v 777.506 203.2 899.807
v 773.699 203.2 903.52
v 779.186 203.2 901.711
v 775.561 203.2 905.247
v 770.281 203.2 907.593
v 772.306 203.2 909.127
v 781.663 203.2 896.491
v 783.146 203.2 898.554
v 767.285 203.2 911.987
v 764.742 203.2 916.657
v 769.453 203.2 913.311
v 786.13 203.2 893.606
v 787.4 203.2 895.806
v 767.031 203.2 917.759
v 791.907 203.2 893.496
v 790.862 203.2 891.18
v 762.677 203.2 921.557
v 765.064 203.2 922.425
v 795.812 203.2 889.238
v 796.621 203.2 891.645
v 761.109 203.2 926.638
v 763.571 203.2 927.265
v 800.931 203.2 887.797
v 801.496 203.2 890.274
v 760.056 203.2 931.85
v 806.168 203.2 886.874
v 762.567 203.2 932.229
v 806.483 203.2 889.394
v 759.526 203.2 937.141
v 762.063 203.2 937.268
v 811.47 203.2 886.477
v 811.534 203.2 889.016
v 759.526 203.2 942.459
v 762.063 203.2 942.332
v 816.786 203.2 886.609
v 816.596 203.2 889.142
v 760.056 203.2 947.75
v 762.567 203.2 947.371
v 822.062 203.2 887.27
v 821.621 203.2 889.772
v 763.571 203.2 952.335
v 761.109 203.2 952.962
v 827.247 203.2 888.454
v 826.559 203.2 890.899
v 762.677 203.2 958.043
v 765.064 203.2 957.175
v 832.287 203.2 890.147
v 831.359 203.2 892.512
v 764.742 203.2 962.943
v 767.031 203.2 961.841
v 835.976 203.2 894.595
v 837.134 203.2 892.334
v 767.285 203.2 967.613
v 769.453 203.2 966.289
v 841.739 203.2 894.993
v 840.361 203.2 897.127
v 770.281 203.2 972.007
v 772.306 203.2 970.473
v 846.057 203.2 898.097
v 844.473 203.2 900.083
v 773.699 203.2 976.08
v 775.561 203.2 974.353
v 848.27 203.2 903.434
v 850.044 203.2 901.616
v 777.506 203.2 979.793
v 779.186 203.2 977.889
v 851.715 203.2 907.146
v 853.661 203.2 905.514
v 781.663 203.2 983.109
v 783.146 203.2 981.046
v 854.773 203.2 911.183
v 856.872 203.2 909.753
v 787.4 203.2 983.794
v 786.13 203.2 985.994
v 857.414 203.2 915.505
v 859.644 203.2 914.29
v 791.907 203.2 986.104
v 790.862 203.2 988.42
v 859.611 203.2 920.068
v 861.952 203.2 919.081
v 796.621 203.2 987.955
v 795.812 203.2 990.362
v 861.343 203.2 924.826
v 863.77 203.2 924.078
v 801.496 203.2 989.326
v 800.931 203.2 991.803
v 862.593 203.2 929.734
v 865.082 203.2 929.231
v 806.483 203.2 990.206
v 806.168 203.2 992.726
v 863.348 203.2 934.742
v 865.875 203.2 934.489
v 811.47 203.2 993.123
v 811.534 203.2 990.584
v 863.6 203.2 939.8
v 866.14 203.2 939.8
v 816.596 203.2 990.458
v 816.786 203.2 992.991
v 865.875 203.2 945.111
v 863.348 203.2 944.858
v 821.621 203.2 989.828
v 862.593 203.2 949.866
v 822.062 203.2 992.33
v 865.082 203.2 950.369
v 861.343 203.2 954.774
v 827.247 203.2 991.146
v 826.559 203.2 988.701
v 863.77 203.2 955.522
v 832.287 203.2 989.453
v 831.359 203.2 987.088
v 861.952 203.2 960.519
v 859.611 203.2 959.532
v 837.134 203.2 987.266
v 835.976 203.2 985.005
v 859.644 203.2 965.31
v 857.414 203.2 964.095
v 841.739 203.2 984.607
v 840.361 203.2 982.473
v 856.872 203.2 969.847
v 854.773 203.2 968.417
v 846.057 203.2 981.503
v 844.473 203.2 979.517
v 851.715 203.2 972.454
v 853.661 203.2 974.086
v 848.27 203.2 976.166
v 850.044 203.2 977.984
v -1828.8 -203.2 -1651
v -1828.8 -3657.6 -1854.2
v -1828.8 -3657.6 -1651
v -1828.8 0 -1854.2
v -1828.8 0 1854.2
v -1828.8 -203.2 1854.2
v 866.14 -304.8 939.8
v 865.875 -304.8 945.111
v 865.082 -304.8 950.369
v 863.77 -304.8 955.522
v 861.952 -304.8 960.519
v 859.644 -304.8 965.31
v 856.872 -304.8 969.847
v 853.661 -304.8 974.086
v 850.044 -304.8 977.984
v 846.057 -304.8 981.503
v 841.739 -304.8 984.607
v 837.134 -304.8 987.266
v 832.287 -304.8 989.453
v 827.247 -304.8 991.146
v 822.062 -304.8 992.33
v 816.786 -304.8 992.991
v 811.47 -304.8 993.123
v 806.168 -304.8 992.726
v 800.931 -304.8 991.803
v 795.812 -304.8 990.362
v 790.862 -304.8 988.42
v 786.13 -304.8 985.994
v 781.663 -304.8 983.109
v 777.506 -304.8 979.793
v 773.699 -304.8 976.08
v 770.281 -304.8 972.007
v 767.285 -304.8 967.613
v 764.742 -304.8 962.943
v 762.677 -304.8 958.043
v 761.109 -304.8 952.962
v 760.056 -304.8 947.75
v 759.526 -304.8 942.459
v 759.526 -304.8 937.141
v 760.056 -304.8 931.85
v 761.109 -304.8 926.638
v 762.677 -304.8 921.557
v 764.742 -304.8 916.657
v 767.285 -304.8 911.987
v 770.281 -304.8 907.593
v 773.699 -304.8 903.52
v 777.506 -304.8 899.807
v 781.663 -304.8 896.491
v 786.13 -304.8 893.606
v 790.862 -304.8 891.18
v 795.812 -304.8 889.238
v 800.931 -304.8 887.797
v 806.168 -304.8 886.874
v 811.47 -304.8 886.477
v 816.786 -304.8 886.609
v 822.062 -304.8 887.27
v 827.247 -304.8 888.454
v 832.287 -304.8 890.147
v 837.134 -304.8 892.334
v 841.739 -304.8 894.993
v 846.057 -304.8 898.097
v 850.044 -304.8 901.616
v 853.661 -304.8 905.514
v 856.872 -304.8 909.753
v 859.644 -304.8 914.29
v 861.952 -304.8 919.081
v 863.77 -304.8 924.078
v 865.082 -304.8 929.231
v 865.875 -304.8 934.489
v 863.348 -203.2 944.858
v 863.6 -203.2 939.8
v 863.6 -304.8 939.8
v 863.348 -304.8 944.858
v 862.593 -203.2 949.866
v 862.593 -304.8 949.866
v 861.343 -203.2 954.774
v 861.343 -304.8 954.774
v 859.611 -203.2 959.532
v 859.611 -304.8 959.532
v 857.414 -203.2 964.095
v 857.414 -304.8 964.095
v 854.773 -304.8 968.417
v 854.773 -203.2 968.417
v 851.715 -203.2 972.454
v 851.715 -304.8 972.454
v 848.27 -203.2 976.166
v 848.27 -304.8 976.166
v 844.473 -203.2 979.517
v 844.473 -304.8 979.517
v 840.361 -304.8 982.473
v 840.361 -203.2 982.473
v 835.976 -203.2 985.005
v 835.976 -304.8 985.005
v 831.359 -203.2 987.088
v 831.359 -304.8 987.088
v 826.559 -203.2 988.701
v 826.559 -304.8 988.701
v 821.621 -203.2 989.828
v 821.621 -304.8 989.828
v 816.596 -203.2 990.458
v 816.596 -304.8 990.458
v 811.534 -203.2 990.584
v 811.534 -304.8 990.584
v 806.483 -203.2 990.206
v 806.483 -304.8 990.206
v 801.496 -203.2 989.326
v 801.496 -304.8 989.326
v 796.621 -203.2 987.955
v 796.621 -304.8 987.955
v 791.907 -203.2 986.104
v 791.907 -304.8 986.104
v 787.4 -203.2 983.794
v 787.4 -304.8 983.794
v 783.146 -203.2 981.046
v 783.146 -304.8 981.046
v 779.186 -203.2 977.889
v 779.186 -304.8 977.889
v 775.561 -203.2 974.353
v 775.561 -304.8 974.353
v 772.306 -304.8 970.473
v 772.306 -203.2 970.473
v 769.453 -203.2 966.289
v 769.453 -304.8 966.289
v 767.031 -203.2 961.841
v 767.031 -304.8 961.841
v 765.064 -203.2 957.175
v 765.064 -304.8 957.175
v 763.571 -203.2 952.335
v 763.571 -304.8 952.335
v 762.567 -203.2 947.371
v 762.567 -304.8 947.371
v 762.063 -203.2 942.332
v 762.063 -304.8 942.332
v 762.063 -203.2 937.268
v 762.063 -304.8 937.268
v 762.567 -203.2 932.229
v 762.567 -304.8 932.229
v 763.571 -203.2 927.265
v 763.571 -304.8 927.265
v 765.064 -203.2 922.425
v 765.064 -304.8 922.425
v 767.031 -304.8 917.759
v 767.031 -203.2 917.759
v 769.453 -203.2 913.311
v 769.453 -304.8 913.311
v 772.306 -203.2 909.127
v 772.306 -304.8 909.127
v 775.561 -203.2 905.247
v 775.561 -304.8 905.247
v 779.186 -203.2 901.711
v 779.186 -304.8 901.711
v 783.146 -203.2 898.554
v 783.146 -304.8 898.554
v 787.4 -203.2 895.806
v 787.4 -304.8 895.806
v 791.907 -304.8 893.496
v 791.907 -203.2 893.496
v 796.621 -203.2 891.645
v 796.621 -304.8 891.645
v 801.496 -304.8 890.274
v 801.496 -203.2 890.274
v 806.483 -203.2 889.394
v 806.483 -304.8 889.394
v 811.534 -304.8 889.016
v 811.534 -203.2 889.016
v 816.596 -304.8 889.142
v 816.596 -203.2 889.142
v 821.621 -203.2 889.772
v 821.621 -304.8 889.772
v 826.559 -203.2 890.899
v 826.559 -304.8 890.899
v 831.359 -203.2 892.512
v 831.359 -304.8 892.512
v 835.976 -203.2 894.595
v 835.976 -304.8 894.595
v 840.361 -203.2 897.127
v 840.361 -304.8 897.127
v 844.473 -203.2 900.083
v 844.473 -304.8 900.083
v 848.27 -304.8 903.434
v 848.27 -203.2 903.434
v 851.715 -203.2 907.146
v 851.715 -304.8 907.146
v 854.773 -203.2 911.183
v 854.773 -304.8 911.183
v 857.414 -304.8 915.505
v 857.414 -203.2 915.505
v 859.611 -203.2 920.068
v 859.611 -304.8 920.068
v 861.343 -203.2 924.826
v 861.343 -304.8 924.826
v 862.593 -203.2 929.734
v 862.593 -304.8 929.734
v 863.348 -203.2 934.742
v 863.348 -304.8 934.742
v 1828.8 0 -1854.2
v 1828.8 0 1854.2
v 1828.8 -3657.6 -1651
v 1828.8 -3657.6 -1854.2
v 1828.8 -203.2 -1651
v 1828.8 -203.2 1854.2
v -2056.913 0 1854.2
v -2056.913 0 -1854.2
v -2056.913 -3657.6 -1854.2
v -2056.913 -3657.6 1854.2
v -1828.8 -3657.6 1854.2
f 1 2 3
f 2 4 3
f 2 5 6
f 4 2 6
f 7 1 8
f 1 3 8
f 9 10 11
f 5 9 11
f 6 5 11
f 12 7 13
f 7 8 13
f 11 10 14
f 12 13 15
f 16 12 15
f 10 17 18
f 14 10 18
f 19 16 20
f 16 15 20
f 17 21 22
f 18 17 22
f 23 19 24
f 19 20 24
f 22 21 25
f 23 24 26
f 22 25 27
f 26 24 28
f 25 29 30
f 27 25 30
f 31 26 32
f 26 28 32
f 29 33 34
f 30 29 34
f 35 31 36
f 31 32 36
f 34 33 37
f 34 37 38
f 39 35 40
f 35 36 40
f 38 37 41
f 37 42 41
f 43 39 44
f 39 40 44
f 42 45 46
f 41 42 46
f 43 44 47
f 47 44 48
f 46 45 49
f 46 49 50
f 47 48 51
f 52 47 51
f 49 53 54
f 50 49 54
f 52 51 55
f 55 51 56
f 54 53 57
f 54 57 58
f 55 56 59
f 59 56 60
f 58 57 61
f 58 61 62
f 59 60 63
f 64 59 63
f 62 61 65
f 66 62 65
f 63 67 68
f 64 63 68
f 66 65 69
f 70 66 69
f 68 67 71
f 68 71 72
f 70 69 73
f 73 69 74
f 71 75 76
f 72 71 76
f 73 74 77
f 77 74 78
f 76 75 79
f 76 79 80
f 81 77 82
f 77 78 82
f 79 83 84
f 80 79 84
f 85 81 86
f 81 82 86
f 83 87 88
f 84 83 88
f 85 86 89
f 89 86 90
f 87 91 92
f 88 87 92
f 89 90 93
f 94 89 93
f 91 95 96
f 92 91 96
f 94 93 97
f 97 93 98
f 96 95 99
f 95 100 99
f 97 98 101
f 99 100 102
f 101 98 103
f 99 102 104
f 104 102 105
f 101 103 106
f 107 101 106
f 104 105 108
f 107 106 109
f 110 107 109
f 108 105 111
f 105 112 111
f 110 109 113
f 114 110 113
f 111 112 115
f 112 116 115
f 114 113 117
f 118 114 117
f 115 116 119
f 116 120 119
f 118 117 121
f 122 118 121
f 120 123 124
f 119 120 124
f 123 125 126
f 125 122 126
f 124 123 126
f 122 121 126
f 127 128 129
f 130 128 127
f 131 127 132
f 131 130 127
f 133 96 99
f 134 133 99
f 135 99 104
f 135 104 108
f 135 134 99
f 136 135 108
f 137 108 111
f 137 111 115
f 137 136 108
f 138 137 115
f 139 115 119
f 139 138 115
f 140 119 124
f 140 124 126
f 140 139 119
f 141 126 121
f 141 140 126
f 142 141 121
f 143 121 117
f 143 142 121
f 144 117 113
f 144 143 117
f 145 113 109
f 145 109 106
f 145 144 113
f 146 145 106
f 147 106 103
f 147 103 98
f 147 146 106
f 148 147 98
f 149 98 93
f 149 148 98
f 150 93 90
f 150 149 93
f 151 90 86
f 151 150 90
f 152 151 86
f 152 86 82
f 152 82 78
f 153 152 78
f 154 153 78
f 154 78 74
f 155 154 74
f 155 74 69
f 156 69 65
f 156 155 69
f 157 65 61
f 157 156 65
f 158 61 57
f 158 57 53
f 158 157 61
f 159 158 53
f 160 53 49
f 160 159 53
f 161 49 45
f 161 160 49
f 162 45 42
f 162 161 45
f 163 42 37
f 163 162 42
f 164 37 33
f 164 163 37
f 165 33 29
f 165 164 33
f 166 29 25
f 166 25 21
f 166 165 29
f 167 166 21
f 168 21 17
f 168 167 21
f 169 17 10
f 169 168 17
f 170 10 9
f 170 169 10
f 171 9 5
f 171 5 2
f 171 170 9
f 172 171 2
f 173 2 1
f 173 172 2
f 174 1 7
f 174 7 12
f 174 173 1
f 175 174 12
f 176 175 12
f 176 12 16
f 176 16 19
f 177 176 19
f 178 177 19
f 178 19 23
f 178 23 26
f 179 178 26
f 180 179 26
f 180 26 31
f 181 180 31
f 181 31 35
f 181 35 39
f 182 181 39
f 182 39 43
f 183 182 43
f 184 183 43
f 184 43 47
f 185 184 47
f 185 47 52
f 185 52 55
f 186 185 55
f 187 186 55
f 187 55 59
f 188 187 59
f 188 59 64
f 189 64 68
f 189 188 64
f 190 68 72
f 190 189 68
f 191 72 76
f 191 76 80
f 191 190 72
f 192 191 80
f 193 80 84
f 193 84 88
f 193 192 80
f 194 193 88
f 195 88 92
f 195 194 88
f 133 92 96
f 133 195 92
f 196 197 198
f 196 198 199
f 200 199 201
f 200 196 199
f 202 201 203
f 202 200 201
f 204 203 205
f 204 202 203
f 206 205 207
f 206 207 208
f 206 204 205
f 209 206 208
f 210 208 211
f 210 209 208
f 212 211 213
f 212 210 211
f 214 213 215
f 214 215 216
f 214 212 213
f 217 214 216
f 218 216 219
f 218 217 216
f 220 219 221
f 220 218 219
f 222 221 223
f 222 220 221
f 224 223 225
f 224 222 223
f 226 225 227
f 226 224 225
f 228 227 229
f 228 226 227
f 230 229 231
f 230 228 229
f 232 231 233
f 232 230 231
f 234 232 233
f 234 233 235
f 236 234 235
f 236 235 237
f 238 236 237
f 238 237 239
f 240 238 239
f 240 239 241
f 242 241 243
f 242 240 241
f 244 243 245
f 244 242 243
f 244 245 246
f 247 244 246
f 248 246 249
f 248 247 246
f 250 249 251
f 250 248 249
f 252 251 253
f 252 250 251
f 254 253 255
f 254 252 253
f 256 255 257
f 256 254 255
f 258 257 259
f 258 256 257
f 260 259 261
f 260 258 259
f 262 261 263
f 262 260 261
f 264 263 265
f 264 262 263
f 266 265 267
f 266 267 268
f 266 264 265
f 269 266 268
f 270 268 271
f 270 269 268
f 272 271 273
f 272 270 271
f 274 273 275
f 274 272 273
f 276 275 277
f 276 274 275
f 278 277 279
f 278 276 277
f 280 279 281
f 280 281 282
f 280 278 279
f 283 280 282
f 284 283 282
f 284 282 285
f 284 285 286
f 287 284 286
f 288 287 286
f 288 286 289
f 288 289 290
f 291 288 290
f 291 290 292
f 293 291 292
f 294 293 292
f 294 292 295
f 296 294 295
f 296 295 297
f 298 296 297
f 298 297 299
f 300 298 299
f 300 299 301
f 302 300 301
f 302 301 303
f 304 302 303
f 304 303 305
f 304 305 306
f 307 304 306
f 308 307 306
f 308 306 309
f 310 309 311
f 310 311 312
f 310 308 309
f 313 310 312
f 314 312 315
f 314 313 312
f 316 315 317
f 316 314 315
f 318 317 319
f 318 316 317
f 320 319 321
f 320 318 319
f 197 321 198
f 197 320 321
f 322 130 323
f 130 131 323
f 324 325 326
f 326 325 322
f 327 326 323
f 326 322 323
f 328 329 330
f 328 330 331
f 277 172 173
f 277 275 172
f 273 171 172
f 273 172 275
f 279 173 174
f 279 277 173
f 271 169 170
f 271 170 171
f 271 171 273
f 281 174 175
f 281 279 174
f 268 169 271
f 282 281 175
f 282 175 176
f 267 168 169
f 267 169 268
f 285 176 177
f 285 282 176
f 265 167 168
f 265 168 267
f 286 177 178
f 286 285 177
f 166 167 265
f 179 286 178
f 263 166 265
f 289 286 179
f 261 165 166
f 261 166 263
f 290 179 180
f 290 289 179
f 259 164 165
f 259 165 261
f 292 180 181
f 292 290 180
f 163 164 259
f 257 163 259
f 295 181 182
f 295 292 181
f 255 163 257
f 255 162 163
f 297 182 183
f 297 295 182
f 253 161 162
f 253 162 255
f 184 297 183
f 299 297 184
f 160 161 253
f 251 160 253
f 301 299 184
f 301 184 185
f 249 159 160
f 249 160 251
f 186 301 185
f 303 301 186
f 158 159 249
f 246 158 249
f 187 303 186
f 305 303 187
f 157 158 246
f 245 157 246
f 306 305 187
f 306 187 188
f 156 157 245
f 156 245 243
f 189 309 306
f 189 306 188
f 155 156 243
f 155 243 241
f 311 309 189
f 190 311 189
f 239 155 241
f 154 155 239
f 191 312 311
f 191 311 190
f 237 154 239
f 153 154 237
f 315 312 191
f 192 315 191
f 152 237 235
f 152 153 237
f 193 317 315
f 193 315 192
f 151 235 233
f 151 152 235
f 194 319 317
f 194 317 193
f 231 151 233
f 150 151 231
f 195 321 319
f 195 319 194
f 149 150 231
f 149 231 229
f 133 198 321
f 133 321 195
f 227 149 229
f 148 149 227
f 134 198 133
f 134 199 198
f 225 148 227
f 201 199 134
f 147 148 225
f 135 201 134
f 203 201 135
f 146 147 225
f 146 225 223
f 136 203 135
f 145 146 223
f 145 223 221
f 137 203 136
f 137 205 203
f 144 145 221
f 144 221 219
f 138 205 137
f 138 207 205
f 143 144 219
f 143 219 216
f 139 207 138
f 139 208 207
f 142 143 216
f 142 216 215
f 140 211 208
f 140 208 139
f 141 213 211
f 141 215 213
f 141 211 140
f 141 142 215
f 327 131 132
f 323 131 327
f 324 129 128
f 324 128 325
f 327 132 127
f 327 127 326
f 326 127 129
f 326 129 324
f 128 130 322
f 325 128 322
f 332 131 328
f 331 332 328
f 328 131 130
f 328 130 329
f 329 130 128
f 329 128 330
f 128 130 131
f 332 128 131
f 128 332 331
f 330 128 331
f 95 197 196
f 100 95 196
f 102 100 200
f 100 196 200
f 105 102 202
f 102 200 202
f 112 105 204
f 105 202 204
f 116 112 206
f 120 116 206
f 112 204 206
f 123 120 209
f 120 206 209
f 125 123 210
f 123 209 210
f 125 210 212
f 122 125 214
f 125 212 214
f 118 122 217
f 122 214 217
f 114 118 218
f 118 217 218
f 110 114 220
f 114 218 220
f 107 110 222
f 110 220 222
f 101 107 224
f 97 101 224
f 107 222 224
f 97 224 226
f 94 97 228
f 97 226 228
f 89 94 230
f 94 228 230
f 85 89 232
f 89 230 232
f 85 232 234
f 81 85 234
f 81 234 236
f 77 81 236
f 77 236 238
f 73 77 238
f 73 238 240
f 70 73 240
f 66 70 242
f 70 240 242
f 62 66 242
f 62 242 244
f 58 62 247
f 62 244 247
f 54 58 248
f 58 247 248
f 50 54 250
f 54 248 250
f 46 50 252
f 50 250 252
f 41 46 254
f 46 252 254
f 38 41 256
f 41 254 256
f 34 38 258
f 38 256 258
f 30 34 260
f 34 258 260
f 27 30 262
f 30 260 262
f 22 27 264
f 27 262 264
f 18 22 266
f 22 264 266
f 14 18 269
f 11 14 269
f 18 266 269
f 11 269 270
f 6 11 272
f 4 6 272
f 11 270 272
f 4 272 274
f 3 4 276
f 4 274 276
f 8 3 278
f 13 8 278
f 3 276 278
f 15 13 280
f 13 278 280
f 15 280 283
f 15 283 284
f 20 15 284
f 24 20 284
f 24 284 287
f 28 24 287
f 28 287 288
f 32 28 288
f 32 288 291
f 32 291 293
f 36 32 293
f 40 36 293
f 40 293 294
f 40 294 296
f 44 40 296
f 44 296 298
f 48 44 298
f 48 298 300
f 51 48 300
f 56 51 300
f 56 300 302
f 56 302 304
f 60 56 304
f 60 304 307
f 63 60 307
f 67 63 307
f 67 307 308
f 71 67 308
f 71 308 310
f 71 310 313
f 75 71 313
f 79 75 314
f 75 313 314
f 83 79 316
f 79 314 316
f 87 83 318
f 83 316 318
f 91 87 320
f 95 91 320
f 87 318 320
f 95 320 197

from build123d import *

# Parameters (mm, degrees)
F0_W     = 3657.6
F0_H     = 3505.2
F1_DEPTH = 203.2
F0_H_2   = 203.2
F2_DEPTH = 3657.6
F3_W     = 228.1128064619
F3_H     = 3708.4
F4_DEPTH = 3657.6
F5_R     = 53.34
F5_R_2   = 50.8
F6_DEPTH = 101.6
F7_DEPTH = 406.4


with BuildPart() as f1:
    # F0 (on Front) → F1 (new body)
    with BuildSketch(Plane.XZ):
        with Locations((0, 101.6)):
            Rectangle(F0_W, F0_H)
    extrude(amount=F1_DEPTH)

    # F0 (on Front) → F2 (join)
    with BuildSketch(Plane.XZ):
        with Locations((0, -1752.6)):
            Rectangle(F0_W, F0_H_2)
    extrude(amount=F2_DEPTH)


with BuildPart() as f4:
    # F3 (on face) → F4 (new body)
    with BuildSketch(Plane(origin=(0, 0, 0), x_dir=(-1, 0, 0), z_dir=(0, 1, 0))):
        with Locations((1942.856403231, 0)):
            Rectangle(F3_W, F3_H)
    extrude(amount=-F4_DEPTH)


with BuildPart() as f6:
    # F5 (on face) → F6 (new body)
    with BuildSketch(Plane.XZ.offset(203.2)):
        with Locations((812.8, 939.8)):
            Circle(F5_R)
        with Locations((812.8, 939.8)):
            Circle(F5_R_2, mode=Mode.SUBTRACT)
    extrude(amount=F6_DEPTH)

    # F5 (on face) → F7 (join)
    with BuildSketch(Plane.XZ.offset(203.2)):
        with Locations((812.8, 939.8)):
            Circle(F5_R)
        with Locations((812.8, 939.8)):
            Circle(F5_R_2, mode=Mode.SUBTRACT)
    extrude(amount=-F7_DEPTH)


solid = Compound([f1.part, f4.part, f6.part])
